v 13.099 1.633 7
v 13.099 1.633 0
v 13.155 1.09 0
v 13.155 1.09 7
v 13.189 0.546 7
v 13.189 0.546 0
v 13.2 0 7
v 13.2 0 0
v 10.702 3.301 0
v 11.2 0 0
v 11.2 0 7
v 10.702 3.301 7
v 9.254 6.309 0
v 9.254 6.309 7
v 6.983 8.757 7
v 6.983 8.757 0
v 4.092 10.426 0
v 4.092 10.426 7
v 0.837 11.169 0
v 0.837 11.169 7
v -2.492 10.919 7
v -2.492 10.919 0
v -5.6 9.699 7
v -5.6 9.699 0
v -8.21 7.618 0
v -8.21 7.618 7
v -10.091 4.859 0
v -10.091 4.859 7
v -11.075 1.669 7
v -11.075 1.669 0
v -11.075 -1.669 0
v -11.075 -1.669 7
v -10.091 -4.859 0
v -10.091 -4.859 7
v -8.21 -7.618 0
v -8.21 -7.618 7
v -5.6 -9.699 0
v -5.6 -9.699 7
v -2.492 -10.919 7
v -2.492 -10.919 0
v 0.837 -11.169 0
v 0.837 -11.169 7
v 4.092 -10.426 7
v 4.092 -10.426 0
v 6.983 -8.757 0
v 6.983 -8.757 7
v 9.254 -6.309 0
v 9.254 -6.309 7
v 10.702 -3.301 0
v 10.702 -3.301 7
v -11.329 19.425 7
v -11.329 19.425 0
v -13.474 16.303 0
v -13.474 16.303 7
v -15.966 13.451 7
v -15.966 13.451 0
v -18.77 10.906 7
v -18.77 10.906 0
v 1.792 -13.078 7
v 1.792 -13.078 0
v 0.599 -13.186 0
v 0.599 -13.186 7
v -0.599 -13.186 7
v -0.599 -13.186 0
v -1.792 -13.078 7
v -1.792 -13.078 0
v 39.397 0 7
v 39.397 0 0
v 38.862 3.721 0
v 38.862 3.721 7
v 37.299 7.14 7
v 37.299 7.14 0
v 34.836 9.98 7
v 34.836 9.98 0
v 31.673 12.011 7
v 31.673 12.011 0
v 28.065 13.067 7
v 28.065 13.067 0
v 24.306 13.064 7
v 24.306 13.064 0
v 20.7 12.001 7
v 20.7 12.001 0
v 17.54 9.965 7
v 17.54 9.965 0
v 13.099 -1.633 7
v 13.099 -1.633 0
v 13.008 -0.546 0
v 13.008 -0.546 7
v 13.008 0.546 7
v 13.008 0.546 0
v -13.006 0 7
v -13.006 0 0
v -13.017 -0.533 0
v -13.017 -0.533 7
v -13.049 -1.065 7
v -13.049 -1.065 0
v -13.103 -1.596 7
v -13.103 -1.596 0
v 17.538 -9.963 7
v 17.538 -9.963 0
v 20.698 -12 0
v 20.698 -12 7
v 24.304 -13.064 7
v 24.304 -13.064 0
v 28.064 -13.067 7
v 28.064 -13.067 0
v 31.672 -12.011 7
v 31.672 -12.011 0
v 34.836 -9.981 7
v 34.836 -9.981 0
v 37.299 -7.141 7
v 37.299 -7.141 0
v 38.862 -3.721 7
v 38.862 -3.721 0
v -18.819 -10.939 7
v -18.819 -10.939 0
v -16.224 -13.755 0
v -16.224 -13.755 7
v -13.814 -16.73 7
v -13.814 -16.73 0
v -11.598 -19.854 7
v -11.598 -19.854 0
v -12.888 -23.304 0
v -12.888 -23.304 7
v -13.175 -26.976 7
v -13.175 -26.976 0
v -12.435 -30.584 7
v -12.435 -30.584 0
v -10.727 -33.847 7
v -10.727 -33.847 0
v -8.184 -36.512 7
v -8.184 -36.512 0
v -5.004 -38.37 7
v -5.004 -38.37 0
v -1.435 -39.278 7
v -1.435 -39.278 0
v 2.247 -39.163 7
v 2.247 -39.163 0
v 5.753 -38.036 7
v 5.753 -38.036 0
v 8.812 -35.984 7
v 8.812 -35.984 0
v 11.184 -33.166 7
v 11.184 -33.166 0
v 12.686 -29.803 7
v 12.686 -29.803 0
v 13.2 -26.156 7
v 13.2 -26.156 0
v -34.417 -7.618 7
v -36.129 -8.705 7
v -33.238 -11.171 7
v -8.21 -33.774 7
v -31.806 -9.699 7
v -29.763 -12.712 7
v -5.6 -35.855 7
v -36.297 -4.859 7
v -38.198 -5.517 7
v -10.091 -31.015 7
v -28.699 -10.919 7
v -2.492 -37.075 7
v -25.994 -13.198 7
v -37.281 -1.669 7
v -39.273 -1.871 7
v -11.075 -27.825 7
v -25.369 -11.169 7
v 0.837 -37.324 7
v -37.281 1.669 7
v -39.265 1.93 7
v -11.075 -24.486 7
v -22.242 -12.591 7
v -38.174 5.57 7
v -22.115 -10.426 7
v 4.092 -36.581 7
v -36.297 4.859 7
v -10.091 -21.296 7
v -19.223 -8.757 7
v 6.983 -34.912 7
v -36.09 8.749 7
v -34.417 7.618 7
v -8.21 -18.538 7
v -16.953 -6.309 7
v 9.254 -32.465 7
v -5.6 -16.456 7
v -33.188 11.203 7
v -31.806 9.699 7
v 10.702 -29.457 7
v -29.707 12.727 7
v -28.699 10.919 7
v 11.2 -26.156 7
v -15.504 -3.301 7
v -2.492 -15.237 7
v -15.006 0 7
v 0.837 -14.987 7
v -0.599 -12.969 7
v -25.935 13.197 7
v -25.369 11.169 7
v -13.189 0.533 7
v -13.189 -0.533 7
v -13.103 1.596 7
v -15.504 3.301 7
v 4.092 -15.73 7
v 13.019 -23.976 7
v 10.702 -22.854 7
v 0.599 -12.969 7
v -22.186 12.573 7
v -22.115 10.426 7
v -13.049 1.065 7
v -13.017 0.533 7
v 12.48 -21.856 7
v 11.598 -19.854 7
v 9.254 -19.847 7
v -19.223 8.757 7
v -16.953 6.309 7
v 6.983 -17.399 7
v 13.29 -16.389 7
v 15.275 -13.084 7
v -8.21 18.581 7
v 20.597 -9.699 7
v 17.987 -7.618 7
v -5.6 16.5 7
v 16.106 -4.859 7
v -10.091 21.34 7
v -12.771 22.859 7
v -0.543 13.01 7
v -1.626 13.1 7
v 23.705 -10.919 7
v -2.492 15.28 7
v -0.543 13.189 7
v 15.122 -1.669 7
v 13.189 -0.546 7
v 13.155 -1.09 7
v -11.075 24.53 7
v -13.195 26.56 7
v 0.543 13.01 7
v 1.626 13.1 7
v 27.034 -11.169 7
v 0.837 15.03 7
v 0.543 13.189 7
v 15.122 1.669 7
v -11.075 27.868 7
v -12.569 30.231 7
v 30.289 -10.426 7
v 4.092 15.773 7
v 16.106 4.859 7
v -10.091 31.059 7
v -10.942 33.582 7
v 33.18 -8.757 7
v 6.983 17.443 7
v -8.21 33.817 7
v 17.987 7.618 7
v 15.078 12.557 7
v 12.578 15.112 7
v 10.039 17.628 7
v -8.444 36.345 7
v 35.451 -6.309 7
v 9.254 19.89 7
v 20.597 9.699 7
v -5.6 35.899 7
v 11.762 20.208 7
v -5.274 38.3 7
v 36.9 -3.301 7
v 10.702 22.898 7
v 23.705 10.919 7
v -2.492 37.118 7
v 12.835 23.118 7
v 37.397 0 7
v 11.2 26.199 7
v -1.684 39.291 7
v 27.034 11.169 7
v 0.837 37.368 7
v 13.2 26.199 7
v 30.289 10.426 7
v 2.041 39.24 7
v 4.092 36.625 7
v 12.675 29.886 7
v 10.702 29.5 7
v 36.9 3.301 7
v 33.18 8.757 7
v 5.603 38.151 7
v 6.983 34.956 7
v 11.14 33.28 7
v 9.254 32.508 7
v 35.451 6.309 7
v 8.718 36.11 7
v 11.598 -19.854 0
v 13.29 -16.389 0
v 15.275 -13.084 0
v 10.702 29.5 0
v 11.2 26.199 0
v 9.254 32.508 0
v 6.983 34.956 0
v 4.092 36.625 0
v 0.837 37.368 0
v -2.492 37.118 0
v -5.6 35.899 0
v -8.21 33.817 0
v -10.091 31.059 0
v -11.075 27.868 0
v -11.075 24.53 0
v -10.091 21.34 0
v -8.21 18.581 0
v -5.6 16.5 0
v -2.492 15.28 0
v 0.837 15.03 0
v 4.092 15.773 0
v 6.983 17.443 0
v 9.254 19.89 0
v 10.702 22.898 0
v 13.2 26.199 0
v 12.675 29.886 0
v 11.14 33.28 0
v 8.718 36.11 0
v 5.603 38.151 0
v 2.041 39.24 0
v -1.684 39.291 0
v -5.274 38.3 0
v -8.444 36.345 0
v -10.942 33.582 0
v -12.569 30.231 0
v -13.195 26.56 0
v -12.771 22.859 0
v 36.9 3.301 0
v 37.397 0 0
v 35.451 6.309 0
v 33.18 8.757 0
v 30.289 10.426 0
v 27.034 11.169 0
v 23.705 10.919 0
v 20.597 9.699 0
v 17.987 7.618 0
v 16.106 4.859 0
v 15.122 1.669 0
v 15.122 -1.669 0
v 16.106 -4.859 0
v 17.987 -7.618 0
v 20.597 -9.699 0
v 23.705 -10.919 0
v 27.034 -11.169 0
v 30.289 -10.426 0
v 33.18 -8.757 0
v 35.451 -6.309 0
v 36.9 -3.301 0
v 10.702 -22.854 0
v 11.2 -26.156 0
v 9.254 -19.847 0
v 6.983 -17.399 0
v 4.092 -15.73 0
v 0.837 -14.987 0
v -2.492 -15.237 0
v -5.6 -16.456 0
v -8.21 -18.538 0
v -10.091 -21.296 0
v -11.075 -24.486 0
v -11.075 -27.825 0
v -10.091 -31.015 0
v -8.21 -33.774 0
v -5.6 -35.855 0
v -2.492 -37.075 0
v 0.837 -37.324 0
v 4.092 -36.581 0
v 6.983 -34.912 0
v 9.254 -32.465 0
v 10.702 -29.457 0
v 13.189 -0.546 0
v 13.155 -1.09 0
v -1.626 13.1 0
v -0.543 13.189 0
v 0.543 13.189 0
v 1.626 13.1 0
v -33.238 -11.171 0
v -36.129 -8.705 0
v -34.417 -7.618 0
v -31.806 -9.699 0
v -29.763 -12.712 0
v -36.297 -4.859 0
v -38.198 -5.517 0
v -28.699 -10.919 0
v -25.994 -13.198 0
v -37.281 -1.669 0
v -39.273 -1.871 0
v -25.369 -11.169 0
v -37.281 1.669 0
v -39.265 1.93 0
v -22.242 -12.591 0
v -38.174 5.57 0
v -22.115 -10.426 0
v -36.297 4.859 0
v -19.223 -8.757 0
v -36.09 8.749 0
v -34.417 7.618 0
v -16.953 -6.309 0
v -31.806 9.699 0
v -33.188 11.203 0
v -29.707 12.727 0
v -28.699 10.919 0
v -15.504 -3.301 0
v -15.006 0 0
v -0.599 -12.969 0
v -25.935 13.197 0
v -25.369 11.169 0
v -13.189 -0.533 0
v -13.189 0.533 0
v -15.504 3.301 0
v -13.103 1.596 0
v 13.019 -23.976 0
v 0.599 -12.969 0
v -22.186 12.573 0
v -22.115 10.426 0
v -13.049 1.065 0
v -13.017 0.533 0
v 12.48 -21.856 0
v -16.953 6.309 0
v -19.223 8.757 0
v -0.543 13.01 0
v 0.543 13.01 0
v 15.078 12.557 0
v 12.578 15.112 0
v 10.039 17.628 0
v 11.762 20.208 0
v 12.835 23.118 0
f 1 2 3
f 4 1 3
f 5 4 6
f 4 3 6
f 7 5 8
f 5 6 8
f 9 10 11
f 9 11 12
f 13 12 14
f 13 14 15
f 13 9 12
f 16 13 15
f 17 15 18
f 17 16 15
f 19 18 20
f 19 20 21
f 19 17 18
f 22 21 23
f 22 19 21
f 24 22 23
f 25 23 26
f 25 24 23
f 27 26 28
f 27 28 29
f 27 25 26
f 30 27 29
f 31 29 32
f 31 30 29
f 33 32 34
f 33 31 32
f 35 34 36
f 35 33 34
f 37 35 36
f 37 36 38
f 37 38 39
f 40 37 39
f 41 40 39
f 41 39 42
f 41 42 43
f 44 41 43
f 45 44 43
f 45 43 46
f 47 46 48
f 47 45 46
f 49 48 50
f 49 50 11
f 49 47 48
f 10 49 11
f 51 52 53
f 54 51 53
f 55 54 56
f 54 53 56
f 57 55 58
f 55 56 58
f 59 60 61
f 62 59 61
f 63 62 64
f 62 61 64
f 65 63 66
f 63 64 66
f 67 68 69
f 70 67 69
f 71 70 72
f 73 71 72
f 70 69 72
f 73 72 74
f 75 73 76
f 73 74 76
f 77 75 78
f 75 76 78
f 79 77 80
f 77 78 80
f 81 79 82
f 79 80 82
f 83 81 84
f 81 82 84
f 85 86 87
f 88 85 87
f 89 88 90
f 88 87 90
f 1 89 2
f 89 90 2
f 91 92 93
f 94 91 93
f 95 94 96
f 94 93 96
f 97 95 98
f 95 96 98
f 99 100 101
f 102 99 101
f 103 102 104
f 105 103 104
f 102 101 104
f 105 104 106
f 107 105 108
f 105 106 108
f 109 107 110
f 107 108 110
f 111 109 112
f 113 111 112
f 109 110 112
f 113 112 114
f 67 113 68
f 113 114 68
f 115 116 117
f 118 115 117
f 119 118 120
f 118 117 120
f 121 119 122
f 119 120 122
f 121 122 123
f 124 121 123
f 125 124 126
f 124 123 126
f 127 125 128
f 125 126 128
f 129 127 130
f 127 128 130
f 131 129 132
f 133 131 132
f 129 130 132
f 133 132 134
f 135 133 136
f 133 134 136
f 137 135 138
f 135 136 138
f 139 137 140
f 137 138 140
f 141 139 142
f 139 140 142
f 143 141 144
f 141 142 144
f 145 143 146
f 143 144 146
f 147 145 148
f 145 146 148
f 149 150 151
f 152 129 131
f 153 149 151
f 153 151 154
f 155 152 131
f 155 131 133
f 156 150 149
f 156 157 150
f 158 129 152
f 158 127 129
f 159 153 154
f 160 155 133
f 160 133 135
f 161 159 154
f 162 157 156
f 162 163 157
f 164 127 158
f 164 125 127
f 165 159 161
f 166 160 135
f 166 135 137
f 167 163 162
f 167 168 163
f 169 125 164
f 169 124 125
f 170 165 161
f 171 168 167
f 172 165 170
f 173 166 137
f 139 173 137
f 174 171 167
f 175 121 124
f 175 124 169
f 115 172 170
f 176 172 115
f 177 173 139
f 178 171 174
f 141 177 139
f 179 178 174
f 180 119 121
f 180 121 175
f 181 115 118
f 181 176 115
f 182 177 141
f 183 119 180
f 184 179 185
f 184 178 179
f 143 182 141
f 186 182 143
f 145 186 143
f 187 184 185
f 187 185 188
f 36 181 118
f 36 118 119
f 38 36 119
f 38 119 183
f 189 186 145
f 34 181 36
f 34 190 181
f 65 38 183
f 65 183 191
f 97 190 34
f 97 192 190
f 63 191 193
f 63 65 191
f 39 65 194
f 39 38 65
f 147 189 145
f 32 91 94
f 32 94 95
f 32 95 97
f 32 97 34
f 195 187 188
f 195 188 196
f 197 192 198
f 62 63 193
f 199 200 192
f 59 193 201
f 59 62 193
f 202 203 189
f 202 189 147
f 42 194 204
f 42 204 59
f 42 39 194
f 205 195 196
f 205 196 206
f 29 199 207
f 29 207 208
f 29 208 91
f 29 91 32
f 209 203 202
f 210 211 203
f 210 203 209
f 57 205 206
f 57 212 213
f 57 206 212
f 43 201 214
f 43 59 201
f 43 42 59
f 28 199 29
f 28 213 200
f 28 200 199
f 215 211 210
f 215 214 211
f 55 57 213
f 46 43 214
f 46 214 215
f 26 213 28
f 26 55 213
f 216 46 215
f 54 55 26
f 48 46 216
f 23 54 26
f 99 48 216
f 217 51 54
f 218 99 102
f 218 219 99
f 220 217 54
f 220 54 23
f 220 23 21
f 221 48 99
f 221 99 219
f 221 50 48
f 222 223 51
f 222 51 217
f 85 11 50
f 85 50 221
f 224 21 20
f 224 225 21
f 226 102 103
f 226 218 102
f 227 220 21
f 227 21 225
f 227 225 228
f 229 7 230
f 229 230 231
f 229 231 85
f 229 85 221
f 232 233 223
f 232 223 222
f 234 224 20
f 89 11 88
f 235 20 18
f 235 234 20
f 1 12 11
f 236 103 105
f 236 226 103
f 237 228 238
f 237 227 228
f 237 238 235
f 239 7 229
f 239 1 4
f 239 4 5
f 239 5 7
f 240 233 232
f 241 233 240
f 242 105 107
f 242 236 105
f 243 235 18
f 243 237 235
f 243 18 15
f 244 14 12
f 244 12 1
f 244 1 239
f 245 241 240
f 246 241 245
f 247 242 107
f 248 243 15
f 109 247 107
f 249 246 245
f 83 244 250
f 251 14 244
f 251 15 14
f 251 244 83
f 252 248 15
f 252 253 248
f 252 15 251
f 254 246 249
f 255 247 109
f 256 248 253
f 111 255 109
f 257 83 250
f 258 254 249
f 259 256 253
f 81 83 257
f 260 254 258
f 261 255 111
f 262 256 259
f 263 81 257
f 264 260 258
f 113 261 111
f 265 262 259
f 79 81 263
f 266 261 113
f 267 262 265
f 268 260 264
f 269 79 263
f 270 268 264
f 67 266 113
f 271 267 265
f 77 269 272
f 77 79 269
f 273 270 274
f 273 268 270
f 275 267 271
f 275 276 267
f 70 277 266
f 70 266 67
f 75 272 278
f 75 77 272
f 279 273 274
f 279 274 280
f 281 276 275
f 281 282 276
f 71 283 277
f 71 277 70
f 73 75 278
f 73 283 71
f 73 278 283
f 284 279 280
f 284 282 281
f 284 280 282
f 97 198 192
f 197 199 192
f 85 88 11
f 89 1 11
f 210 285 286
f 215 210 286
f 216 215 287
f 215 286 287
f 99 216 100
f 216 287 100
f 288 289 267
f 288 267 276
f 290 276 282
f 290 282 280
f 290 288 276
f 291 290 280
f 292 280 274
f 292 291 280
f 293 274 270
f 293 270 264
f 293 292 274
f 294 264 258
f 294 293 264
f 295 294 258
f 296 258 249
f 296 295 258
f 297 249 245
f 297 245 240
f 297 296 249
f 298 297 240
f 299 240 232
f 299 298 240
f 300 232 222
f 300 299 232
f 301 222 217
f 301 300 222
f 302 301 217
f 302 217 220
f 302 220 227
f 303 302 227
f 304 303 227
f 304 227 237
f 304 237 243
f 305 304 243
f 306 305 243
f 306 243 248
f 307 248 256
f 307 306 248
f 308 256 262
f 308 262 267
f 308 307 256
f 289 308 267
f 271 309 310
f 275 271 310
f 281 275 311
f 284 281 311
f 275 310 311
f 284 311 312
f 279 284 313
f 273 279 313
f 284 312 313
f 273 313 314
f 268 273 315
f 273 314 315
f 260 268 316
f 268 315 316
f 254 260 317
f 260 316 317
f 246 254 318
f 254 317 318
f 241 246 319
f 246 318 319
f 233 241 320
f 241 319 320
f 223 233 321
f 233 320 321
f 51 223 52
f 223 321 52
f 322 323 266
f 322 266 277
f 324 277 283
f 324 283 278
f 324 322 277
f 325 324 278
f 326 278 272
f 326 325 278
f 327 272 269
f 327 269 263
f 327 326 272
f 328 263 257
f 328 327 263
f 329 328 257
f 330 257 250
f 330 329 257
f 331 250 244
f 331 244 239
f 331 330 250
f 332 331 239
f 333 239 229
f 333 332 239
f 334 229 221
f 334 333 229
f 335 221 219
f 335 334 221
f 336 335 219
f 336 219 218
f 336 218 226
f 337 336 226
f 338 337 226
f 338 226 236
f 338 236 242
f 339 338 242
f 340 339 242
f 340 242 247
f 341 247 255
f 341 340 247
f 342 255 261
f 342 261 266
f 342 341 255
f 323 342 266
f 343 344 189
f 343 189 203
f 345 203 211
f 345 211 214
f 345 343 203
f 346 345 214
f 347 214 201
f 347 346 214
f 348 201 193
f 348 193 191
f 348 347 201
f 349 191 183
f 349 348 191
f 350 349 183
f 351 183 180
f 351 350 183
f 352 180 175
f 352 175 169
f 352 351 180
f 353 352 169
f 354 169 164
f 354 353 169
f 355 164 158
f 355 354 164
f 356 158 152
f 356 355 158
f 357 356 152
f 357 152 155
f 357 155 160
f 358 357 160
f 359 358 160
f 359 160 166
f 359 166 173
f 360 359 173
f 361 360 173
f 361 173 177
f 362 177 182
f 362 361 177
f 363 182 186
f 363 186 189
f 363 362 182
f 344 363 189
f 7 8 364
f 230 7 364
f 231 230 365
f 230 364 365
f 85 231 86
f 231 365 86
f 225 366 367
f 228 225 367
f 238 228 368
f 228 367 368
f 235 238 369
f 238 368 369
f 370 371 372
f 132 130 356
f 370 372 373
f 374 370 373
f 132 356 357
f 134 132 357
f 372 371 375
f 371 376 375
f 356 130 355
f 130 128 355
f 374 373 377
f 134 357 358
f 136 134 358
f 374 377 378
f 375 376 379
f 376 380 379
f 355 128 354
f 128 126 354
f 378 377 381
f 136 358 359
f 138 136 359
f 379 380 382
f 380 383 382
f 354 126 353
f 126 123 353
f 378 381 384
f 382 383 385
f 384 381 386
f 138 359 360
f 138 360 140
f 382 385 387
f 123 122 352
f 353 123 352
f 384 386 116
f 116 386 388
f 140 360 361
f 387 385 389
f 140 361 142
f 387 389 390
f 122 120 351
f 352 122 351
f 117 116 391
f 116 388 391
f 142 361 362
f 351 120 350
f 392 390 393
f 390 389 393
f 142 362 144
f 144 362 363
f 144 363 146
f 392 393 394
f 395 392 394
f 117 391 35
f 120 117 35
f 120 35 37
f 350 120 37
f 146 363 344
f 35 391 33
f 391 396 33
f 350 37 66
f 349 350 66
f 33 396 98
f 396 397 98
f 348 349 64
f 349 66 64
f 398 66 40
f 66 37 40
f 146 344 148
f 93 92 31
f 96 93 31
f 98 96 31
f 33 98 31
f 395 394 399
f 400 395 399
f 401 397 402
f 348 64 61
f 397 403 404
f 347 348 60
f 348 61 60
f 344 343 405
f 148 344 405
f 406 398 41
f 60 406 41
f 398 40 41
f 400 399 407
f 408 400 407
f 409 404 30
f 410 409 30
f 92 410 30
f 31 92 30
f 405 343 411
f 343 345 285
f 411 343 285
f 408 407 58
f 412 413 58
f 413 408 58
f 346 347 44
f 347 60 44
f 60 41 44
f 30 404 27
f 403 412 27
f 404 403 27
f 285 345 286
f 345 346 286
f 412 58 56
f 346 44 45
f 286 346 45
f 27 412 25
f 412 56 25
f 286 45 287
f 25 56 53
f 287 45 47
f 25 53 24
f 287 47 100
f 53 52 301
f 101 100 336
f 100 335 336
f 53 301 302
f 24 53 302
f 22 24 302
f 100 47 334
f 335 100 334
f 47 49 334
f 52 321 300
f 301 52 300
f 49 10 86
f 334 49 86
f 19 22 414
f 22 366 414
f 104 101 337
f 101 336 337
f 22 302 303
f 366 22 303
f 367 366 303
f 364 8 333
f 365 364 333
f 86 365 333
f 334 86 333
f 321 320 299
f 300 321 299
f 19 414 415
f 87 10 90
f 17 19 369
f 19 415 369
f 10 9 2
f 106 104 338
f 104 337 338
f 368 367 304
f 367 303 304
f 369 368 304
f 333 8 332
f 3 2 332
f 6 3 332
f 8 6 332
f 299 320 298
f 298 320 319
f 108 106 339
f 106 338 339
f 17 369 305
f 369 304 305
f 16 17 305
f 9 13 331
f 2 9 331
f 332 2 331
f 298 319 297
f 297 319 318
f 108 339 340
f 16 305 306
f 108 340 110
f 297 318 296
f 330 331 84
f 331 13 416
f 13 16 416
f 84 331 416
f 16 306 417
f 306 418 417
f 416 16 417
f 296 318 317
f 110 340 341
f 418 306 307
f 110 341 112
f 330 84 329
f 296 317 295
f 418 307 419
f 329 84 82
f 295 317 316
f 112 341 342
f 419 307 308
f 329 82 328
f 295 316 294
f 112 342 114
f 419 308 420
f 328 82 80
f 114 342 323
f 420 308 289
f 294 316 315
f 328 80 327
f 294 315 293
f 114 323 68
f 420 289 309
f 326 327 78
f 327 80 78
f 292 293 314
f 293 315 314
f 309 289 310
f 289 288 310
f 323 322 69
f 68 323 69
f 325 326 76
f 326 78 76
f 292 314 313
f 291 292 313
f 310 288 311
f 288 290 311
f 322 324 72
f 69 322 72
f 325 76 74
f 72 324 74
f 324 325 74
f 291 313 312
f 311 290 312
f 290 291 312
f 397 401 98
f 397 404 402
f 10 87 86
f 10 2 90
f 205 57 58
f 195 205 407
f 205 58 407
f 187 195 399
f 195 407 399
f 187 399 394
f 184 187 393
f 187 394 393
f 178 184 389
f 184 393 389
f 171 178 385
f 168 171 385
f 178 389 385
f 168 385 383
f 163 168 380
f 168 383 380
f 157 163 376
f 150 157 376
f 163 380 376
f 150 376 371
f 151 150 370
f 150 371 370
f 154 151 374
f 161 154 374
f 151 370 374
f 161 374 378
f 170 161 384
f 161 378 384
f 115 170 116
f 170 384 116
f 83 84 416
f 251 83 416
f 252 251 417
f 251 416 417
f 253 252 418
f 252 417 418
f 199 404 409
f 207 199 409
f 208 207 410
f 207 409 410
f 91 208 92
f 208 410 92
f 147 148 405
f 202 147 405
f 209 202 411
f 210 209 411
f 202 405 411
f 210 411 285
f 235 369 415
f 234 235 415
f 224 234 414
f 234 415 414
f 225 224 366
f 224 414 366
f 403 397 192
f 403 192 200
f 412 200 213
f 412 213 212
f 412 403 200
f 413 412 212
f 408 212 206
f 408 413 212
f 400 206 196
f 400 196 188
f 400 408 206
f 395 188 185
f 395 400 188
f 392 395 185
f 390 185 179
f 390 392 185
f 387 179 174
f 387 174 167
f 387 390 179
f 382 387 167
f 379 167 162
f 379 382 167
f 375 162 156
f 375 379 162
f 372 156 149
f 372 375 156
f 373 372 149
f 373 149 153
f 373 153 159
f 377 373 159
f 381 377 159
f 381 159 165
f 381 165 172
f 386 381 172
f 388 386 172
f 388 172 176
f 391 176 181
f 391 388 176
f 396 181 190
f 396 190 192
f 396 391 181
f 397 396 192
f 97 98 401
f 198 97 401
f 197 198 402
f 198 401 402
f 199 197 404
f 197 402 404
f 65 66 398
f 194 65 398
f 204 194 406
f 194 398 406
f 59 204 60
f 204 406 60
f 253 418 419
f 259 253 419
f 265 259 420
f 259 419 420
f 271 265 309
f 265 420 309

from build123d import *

# Parameters (mm, degrees)
F0_R     = 11.2
F1_DEPTH = 7


with BuildPart() as f1:
    # F0 (on Top) → F1 (new body)
    with BuildSketch(Plane.XY):
        with BuildLine():
            ThreePointArc((1.625641, 13.099515), (9.331043, 9.336575), (13.098549, 1.633405))
            ThreePointArc((13.098549, 1.633405), (14.54896, 6.209741), (17.540058, 9.964721))
            ThreePointArc((17.540058, 9.964721), (13.833044, 13.839076), (10.039052, 17.628298))
            ThreePointArc((10.039052, 17.628298), (6.256496, 14.575938), (1.625641, 13.099515))
        make_face()
        with BuildLine():
            ThreePointArc((13.098549, 1.633405), (13.174613, 0.818276), (13.2, 0))
            ThreePointArc((13.2, 0), (13.174613, -0.818276), (13.098549, -1.633405))
            ThreePointArc((13.098549, -1.633405), (14.548449, -6.208782), (17.538418, -9.963296))
            ThreePointArc((17.538418, -9.963296), (31.671832, -12.011132), (39.397098, 0))
            ThreePointArc((39.397098, 0), (31.672821, 12.010681), (17.540058, 9.964721))
            ThreePointArc((17.540058, 9.964721), (14.54896, 6.209741), (13.098549, 1.633405))
        make_face()
        with Locations((26.197098, 0)):
            Circle(F0_R, mode=Mode.SUBTRACT)
        with BuildLine():
            ThreePointArc((-1.625641, 13.099515), (0, 13.2), (1.625641, 13.099515))
            ThreePointArc((1.625641, 13.099515), (6.256496, 14.575938), (10.039052, 17.628298))
            ThreePointArc((10.039052, 17.628298), (12.384577, 21.631508), (13.2, 26.19903))
            ThreePointArc((13.2, 26.19903), (-3.51391, 38.922726), (-11.329158, 19.4248))
            ThreePointArc((-11.329158, 19.4248), (-7.20826, 15.140956), (-1.625641, 13.099515))
        make_face()
        with Locations((0, 26.19903)):
            Circle(F0_R, mode=Mode.SUBTRACT)
        with BuildLine():
            ThreePointArc((-13.103194, 1.595718), (-9.344462, 9.323144), (-1.625641, 13.099515))
            ThreePointArc((-1.625641, 13.099515), (-7.20826, 15.140956), (-11.329158, 19.4248))
            ThreePointArc((-11.329158, 19.4248), (-14.678509, 14.841206), (-18.770392, 10.906235))
            ThreePointArc((-18.770392, 10.906235), (-14.930927, 6.863235), (-13.103194, 1.595718))
        make_face()
        with BuildLine():
            ThreePointArc((-13.103194, -1.595718), (-13.2, 0), (-13.103194, 1.595718))
            ThreePointArc((-13.103194, 1.595718), (-14.930927, 6.863235), (-18.770392, 10.906235))
            ThreePointArc((-18.770392, 10.906235), (-39.406354, 0.029513), (-18.819234, -10.939377))
            ThreePointArc((-18.819234, -10.939377), (-14.9463, -6.888428), (-13.103194, -1.595718))
        make_face()
        with Locations((-26.206387, 0)):
            Circle(F0_R, mode=Mode.SUBTRACT)
        with BuildLine():
            ThreePointArc((13.098549, -1.633405), (12.997098, 0), (13.098549, 1.633405))
            ThreePointArc((13.098549, 1.633405), (9.331043, 9.336575), (1.625641, 13.099515))
            ThreePointArc((1.625641, 13.099515), (0, 12.99903), (-1.625641, 13.099515))
            ThreePointArc((-1.625641, 13.099515), (-9.344462, 9.323144), (-13.103194, 1.595718))
            ThreePointArc((-13.103194, 1.595718), (-13.030611, 0.799326), (-13.006387, 0))
            ThreePointArc((-13.006387, 0), (-13.030611, -0.799326), (-13.103194, -1.595718))
            ThreePointArc((-13.103194, -1.595718), (-9.403382, -9.263714), (-1.791606, -13.07785))
            ThreePointArc((-1.791606, -13.07785), (0, -12.955699), (1.791606, -13.07785))
            ThreePointArc((1.791606, -13.07785), (9.390048, -9.27723), (13.098549, -1.633405))
        make_face()
        Circle(F0_R, mode=Mode.SUBTRACT)
        with BuildLine():
            ThreePointArc((-11.598392, -19.853533), (-7.503365, -15.295703), (-1.791606, -13.07785))
            ThreePointArc((-1.791606, -13.07785), (-9.403382, -9.263714), (-13.103194, -1.595718))
            ThreePointArc((-13.103194, -1.595718), (-14.9463, -6.888428), (-18.819234, -10.939377))
            ThreePointArc((-18.819234, -10.939377), (-14.994912, -15.223186), (-11.598392, -19.853533))
        make_face()
        with BuildLine():
            ThreePointArc((11.598392, -19.853533), (7.503365, -15.295703), (1.791606, -13.07785))
            ThreePointArc((1.791606, -13.07785), (0, -13.2), (-1.791606, -13.07785))
            ThreePointArc((-1.791606, -13.07785), (-7.503365, -15.295703), (-11.598392, -19.853533))
            ThreePointArc((-11.598392, -19.853533), (-3.251248, -38.949033), (13.2, -26.155699))
            ThreePointArc((13.2, -26.155699), (12.793334, -22.904451), (11.598392, -19.853533))
        make_face()
        with Locations((0, -26.155699)):
            Circle(F0_R, mode=Mode.SUBTRACT)
        with BuildLine():
            ThreePointArc((17.538418, -9.963296), (14.548449, -6.208782), (13.098549, -1.633405))
            ThreePointArc((13.098549, -1.633405), (9.390048, -9.27723), (1.791606, -13.07785))
            ThreePointArc((1.791606, -13.07785), (7.503365, -15.295703), (11.598392, -19.853533))
            ThreePointArc((11.598392, -19.853533), (14.246289, -14.714953), (17.538418, -9.963296))
        make_face()
    extrude(amount=F1_DEPTH)


solid = f1.part
